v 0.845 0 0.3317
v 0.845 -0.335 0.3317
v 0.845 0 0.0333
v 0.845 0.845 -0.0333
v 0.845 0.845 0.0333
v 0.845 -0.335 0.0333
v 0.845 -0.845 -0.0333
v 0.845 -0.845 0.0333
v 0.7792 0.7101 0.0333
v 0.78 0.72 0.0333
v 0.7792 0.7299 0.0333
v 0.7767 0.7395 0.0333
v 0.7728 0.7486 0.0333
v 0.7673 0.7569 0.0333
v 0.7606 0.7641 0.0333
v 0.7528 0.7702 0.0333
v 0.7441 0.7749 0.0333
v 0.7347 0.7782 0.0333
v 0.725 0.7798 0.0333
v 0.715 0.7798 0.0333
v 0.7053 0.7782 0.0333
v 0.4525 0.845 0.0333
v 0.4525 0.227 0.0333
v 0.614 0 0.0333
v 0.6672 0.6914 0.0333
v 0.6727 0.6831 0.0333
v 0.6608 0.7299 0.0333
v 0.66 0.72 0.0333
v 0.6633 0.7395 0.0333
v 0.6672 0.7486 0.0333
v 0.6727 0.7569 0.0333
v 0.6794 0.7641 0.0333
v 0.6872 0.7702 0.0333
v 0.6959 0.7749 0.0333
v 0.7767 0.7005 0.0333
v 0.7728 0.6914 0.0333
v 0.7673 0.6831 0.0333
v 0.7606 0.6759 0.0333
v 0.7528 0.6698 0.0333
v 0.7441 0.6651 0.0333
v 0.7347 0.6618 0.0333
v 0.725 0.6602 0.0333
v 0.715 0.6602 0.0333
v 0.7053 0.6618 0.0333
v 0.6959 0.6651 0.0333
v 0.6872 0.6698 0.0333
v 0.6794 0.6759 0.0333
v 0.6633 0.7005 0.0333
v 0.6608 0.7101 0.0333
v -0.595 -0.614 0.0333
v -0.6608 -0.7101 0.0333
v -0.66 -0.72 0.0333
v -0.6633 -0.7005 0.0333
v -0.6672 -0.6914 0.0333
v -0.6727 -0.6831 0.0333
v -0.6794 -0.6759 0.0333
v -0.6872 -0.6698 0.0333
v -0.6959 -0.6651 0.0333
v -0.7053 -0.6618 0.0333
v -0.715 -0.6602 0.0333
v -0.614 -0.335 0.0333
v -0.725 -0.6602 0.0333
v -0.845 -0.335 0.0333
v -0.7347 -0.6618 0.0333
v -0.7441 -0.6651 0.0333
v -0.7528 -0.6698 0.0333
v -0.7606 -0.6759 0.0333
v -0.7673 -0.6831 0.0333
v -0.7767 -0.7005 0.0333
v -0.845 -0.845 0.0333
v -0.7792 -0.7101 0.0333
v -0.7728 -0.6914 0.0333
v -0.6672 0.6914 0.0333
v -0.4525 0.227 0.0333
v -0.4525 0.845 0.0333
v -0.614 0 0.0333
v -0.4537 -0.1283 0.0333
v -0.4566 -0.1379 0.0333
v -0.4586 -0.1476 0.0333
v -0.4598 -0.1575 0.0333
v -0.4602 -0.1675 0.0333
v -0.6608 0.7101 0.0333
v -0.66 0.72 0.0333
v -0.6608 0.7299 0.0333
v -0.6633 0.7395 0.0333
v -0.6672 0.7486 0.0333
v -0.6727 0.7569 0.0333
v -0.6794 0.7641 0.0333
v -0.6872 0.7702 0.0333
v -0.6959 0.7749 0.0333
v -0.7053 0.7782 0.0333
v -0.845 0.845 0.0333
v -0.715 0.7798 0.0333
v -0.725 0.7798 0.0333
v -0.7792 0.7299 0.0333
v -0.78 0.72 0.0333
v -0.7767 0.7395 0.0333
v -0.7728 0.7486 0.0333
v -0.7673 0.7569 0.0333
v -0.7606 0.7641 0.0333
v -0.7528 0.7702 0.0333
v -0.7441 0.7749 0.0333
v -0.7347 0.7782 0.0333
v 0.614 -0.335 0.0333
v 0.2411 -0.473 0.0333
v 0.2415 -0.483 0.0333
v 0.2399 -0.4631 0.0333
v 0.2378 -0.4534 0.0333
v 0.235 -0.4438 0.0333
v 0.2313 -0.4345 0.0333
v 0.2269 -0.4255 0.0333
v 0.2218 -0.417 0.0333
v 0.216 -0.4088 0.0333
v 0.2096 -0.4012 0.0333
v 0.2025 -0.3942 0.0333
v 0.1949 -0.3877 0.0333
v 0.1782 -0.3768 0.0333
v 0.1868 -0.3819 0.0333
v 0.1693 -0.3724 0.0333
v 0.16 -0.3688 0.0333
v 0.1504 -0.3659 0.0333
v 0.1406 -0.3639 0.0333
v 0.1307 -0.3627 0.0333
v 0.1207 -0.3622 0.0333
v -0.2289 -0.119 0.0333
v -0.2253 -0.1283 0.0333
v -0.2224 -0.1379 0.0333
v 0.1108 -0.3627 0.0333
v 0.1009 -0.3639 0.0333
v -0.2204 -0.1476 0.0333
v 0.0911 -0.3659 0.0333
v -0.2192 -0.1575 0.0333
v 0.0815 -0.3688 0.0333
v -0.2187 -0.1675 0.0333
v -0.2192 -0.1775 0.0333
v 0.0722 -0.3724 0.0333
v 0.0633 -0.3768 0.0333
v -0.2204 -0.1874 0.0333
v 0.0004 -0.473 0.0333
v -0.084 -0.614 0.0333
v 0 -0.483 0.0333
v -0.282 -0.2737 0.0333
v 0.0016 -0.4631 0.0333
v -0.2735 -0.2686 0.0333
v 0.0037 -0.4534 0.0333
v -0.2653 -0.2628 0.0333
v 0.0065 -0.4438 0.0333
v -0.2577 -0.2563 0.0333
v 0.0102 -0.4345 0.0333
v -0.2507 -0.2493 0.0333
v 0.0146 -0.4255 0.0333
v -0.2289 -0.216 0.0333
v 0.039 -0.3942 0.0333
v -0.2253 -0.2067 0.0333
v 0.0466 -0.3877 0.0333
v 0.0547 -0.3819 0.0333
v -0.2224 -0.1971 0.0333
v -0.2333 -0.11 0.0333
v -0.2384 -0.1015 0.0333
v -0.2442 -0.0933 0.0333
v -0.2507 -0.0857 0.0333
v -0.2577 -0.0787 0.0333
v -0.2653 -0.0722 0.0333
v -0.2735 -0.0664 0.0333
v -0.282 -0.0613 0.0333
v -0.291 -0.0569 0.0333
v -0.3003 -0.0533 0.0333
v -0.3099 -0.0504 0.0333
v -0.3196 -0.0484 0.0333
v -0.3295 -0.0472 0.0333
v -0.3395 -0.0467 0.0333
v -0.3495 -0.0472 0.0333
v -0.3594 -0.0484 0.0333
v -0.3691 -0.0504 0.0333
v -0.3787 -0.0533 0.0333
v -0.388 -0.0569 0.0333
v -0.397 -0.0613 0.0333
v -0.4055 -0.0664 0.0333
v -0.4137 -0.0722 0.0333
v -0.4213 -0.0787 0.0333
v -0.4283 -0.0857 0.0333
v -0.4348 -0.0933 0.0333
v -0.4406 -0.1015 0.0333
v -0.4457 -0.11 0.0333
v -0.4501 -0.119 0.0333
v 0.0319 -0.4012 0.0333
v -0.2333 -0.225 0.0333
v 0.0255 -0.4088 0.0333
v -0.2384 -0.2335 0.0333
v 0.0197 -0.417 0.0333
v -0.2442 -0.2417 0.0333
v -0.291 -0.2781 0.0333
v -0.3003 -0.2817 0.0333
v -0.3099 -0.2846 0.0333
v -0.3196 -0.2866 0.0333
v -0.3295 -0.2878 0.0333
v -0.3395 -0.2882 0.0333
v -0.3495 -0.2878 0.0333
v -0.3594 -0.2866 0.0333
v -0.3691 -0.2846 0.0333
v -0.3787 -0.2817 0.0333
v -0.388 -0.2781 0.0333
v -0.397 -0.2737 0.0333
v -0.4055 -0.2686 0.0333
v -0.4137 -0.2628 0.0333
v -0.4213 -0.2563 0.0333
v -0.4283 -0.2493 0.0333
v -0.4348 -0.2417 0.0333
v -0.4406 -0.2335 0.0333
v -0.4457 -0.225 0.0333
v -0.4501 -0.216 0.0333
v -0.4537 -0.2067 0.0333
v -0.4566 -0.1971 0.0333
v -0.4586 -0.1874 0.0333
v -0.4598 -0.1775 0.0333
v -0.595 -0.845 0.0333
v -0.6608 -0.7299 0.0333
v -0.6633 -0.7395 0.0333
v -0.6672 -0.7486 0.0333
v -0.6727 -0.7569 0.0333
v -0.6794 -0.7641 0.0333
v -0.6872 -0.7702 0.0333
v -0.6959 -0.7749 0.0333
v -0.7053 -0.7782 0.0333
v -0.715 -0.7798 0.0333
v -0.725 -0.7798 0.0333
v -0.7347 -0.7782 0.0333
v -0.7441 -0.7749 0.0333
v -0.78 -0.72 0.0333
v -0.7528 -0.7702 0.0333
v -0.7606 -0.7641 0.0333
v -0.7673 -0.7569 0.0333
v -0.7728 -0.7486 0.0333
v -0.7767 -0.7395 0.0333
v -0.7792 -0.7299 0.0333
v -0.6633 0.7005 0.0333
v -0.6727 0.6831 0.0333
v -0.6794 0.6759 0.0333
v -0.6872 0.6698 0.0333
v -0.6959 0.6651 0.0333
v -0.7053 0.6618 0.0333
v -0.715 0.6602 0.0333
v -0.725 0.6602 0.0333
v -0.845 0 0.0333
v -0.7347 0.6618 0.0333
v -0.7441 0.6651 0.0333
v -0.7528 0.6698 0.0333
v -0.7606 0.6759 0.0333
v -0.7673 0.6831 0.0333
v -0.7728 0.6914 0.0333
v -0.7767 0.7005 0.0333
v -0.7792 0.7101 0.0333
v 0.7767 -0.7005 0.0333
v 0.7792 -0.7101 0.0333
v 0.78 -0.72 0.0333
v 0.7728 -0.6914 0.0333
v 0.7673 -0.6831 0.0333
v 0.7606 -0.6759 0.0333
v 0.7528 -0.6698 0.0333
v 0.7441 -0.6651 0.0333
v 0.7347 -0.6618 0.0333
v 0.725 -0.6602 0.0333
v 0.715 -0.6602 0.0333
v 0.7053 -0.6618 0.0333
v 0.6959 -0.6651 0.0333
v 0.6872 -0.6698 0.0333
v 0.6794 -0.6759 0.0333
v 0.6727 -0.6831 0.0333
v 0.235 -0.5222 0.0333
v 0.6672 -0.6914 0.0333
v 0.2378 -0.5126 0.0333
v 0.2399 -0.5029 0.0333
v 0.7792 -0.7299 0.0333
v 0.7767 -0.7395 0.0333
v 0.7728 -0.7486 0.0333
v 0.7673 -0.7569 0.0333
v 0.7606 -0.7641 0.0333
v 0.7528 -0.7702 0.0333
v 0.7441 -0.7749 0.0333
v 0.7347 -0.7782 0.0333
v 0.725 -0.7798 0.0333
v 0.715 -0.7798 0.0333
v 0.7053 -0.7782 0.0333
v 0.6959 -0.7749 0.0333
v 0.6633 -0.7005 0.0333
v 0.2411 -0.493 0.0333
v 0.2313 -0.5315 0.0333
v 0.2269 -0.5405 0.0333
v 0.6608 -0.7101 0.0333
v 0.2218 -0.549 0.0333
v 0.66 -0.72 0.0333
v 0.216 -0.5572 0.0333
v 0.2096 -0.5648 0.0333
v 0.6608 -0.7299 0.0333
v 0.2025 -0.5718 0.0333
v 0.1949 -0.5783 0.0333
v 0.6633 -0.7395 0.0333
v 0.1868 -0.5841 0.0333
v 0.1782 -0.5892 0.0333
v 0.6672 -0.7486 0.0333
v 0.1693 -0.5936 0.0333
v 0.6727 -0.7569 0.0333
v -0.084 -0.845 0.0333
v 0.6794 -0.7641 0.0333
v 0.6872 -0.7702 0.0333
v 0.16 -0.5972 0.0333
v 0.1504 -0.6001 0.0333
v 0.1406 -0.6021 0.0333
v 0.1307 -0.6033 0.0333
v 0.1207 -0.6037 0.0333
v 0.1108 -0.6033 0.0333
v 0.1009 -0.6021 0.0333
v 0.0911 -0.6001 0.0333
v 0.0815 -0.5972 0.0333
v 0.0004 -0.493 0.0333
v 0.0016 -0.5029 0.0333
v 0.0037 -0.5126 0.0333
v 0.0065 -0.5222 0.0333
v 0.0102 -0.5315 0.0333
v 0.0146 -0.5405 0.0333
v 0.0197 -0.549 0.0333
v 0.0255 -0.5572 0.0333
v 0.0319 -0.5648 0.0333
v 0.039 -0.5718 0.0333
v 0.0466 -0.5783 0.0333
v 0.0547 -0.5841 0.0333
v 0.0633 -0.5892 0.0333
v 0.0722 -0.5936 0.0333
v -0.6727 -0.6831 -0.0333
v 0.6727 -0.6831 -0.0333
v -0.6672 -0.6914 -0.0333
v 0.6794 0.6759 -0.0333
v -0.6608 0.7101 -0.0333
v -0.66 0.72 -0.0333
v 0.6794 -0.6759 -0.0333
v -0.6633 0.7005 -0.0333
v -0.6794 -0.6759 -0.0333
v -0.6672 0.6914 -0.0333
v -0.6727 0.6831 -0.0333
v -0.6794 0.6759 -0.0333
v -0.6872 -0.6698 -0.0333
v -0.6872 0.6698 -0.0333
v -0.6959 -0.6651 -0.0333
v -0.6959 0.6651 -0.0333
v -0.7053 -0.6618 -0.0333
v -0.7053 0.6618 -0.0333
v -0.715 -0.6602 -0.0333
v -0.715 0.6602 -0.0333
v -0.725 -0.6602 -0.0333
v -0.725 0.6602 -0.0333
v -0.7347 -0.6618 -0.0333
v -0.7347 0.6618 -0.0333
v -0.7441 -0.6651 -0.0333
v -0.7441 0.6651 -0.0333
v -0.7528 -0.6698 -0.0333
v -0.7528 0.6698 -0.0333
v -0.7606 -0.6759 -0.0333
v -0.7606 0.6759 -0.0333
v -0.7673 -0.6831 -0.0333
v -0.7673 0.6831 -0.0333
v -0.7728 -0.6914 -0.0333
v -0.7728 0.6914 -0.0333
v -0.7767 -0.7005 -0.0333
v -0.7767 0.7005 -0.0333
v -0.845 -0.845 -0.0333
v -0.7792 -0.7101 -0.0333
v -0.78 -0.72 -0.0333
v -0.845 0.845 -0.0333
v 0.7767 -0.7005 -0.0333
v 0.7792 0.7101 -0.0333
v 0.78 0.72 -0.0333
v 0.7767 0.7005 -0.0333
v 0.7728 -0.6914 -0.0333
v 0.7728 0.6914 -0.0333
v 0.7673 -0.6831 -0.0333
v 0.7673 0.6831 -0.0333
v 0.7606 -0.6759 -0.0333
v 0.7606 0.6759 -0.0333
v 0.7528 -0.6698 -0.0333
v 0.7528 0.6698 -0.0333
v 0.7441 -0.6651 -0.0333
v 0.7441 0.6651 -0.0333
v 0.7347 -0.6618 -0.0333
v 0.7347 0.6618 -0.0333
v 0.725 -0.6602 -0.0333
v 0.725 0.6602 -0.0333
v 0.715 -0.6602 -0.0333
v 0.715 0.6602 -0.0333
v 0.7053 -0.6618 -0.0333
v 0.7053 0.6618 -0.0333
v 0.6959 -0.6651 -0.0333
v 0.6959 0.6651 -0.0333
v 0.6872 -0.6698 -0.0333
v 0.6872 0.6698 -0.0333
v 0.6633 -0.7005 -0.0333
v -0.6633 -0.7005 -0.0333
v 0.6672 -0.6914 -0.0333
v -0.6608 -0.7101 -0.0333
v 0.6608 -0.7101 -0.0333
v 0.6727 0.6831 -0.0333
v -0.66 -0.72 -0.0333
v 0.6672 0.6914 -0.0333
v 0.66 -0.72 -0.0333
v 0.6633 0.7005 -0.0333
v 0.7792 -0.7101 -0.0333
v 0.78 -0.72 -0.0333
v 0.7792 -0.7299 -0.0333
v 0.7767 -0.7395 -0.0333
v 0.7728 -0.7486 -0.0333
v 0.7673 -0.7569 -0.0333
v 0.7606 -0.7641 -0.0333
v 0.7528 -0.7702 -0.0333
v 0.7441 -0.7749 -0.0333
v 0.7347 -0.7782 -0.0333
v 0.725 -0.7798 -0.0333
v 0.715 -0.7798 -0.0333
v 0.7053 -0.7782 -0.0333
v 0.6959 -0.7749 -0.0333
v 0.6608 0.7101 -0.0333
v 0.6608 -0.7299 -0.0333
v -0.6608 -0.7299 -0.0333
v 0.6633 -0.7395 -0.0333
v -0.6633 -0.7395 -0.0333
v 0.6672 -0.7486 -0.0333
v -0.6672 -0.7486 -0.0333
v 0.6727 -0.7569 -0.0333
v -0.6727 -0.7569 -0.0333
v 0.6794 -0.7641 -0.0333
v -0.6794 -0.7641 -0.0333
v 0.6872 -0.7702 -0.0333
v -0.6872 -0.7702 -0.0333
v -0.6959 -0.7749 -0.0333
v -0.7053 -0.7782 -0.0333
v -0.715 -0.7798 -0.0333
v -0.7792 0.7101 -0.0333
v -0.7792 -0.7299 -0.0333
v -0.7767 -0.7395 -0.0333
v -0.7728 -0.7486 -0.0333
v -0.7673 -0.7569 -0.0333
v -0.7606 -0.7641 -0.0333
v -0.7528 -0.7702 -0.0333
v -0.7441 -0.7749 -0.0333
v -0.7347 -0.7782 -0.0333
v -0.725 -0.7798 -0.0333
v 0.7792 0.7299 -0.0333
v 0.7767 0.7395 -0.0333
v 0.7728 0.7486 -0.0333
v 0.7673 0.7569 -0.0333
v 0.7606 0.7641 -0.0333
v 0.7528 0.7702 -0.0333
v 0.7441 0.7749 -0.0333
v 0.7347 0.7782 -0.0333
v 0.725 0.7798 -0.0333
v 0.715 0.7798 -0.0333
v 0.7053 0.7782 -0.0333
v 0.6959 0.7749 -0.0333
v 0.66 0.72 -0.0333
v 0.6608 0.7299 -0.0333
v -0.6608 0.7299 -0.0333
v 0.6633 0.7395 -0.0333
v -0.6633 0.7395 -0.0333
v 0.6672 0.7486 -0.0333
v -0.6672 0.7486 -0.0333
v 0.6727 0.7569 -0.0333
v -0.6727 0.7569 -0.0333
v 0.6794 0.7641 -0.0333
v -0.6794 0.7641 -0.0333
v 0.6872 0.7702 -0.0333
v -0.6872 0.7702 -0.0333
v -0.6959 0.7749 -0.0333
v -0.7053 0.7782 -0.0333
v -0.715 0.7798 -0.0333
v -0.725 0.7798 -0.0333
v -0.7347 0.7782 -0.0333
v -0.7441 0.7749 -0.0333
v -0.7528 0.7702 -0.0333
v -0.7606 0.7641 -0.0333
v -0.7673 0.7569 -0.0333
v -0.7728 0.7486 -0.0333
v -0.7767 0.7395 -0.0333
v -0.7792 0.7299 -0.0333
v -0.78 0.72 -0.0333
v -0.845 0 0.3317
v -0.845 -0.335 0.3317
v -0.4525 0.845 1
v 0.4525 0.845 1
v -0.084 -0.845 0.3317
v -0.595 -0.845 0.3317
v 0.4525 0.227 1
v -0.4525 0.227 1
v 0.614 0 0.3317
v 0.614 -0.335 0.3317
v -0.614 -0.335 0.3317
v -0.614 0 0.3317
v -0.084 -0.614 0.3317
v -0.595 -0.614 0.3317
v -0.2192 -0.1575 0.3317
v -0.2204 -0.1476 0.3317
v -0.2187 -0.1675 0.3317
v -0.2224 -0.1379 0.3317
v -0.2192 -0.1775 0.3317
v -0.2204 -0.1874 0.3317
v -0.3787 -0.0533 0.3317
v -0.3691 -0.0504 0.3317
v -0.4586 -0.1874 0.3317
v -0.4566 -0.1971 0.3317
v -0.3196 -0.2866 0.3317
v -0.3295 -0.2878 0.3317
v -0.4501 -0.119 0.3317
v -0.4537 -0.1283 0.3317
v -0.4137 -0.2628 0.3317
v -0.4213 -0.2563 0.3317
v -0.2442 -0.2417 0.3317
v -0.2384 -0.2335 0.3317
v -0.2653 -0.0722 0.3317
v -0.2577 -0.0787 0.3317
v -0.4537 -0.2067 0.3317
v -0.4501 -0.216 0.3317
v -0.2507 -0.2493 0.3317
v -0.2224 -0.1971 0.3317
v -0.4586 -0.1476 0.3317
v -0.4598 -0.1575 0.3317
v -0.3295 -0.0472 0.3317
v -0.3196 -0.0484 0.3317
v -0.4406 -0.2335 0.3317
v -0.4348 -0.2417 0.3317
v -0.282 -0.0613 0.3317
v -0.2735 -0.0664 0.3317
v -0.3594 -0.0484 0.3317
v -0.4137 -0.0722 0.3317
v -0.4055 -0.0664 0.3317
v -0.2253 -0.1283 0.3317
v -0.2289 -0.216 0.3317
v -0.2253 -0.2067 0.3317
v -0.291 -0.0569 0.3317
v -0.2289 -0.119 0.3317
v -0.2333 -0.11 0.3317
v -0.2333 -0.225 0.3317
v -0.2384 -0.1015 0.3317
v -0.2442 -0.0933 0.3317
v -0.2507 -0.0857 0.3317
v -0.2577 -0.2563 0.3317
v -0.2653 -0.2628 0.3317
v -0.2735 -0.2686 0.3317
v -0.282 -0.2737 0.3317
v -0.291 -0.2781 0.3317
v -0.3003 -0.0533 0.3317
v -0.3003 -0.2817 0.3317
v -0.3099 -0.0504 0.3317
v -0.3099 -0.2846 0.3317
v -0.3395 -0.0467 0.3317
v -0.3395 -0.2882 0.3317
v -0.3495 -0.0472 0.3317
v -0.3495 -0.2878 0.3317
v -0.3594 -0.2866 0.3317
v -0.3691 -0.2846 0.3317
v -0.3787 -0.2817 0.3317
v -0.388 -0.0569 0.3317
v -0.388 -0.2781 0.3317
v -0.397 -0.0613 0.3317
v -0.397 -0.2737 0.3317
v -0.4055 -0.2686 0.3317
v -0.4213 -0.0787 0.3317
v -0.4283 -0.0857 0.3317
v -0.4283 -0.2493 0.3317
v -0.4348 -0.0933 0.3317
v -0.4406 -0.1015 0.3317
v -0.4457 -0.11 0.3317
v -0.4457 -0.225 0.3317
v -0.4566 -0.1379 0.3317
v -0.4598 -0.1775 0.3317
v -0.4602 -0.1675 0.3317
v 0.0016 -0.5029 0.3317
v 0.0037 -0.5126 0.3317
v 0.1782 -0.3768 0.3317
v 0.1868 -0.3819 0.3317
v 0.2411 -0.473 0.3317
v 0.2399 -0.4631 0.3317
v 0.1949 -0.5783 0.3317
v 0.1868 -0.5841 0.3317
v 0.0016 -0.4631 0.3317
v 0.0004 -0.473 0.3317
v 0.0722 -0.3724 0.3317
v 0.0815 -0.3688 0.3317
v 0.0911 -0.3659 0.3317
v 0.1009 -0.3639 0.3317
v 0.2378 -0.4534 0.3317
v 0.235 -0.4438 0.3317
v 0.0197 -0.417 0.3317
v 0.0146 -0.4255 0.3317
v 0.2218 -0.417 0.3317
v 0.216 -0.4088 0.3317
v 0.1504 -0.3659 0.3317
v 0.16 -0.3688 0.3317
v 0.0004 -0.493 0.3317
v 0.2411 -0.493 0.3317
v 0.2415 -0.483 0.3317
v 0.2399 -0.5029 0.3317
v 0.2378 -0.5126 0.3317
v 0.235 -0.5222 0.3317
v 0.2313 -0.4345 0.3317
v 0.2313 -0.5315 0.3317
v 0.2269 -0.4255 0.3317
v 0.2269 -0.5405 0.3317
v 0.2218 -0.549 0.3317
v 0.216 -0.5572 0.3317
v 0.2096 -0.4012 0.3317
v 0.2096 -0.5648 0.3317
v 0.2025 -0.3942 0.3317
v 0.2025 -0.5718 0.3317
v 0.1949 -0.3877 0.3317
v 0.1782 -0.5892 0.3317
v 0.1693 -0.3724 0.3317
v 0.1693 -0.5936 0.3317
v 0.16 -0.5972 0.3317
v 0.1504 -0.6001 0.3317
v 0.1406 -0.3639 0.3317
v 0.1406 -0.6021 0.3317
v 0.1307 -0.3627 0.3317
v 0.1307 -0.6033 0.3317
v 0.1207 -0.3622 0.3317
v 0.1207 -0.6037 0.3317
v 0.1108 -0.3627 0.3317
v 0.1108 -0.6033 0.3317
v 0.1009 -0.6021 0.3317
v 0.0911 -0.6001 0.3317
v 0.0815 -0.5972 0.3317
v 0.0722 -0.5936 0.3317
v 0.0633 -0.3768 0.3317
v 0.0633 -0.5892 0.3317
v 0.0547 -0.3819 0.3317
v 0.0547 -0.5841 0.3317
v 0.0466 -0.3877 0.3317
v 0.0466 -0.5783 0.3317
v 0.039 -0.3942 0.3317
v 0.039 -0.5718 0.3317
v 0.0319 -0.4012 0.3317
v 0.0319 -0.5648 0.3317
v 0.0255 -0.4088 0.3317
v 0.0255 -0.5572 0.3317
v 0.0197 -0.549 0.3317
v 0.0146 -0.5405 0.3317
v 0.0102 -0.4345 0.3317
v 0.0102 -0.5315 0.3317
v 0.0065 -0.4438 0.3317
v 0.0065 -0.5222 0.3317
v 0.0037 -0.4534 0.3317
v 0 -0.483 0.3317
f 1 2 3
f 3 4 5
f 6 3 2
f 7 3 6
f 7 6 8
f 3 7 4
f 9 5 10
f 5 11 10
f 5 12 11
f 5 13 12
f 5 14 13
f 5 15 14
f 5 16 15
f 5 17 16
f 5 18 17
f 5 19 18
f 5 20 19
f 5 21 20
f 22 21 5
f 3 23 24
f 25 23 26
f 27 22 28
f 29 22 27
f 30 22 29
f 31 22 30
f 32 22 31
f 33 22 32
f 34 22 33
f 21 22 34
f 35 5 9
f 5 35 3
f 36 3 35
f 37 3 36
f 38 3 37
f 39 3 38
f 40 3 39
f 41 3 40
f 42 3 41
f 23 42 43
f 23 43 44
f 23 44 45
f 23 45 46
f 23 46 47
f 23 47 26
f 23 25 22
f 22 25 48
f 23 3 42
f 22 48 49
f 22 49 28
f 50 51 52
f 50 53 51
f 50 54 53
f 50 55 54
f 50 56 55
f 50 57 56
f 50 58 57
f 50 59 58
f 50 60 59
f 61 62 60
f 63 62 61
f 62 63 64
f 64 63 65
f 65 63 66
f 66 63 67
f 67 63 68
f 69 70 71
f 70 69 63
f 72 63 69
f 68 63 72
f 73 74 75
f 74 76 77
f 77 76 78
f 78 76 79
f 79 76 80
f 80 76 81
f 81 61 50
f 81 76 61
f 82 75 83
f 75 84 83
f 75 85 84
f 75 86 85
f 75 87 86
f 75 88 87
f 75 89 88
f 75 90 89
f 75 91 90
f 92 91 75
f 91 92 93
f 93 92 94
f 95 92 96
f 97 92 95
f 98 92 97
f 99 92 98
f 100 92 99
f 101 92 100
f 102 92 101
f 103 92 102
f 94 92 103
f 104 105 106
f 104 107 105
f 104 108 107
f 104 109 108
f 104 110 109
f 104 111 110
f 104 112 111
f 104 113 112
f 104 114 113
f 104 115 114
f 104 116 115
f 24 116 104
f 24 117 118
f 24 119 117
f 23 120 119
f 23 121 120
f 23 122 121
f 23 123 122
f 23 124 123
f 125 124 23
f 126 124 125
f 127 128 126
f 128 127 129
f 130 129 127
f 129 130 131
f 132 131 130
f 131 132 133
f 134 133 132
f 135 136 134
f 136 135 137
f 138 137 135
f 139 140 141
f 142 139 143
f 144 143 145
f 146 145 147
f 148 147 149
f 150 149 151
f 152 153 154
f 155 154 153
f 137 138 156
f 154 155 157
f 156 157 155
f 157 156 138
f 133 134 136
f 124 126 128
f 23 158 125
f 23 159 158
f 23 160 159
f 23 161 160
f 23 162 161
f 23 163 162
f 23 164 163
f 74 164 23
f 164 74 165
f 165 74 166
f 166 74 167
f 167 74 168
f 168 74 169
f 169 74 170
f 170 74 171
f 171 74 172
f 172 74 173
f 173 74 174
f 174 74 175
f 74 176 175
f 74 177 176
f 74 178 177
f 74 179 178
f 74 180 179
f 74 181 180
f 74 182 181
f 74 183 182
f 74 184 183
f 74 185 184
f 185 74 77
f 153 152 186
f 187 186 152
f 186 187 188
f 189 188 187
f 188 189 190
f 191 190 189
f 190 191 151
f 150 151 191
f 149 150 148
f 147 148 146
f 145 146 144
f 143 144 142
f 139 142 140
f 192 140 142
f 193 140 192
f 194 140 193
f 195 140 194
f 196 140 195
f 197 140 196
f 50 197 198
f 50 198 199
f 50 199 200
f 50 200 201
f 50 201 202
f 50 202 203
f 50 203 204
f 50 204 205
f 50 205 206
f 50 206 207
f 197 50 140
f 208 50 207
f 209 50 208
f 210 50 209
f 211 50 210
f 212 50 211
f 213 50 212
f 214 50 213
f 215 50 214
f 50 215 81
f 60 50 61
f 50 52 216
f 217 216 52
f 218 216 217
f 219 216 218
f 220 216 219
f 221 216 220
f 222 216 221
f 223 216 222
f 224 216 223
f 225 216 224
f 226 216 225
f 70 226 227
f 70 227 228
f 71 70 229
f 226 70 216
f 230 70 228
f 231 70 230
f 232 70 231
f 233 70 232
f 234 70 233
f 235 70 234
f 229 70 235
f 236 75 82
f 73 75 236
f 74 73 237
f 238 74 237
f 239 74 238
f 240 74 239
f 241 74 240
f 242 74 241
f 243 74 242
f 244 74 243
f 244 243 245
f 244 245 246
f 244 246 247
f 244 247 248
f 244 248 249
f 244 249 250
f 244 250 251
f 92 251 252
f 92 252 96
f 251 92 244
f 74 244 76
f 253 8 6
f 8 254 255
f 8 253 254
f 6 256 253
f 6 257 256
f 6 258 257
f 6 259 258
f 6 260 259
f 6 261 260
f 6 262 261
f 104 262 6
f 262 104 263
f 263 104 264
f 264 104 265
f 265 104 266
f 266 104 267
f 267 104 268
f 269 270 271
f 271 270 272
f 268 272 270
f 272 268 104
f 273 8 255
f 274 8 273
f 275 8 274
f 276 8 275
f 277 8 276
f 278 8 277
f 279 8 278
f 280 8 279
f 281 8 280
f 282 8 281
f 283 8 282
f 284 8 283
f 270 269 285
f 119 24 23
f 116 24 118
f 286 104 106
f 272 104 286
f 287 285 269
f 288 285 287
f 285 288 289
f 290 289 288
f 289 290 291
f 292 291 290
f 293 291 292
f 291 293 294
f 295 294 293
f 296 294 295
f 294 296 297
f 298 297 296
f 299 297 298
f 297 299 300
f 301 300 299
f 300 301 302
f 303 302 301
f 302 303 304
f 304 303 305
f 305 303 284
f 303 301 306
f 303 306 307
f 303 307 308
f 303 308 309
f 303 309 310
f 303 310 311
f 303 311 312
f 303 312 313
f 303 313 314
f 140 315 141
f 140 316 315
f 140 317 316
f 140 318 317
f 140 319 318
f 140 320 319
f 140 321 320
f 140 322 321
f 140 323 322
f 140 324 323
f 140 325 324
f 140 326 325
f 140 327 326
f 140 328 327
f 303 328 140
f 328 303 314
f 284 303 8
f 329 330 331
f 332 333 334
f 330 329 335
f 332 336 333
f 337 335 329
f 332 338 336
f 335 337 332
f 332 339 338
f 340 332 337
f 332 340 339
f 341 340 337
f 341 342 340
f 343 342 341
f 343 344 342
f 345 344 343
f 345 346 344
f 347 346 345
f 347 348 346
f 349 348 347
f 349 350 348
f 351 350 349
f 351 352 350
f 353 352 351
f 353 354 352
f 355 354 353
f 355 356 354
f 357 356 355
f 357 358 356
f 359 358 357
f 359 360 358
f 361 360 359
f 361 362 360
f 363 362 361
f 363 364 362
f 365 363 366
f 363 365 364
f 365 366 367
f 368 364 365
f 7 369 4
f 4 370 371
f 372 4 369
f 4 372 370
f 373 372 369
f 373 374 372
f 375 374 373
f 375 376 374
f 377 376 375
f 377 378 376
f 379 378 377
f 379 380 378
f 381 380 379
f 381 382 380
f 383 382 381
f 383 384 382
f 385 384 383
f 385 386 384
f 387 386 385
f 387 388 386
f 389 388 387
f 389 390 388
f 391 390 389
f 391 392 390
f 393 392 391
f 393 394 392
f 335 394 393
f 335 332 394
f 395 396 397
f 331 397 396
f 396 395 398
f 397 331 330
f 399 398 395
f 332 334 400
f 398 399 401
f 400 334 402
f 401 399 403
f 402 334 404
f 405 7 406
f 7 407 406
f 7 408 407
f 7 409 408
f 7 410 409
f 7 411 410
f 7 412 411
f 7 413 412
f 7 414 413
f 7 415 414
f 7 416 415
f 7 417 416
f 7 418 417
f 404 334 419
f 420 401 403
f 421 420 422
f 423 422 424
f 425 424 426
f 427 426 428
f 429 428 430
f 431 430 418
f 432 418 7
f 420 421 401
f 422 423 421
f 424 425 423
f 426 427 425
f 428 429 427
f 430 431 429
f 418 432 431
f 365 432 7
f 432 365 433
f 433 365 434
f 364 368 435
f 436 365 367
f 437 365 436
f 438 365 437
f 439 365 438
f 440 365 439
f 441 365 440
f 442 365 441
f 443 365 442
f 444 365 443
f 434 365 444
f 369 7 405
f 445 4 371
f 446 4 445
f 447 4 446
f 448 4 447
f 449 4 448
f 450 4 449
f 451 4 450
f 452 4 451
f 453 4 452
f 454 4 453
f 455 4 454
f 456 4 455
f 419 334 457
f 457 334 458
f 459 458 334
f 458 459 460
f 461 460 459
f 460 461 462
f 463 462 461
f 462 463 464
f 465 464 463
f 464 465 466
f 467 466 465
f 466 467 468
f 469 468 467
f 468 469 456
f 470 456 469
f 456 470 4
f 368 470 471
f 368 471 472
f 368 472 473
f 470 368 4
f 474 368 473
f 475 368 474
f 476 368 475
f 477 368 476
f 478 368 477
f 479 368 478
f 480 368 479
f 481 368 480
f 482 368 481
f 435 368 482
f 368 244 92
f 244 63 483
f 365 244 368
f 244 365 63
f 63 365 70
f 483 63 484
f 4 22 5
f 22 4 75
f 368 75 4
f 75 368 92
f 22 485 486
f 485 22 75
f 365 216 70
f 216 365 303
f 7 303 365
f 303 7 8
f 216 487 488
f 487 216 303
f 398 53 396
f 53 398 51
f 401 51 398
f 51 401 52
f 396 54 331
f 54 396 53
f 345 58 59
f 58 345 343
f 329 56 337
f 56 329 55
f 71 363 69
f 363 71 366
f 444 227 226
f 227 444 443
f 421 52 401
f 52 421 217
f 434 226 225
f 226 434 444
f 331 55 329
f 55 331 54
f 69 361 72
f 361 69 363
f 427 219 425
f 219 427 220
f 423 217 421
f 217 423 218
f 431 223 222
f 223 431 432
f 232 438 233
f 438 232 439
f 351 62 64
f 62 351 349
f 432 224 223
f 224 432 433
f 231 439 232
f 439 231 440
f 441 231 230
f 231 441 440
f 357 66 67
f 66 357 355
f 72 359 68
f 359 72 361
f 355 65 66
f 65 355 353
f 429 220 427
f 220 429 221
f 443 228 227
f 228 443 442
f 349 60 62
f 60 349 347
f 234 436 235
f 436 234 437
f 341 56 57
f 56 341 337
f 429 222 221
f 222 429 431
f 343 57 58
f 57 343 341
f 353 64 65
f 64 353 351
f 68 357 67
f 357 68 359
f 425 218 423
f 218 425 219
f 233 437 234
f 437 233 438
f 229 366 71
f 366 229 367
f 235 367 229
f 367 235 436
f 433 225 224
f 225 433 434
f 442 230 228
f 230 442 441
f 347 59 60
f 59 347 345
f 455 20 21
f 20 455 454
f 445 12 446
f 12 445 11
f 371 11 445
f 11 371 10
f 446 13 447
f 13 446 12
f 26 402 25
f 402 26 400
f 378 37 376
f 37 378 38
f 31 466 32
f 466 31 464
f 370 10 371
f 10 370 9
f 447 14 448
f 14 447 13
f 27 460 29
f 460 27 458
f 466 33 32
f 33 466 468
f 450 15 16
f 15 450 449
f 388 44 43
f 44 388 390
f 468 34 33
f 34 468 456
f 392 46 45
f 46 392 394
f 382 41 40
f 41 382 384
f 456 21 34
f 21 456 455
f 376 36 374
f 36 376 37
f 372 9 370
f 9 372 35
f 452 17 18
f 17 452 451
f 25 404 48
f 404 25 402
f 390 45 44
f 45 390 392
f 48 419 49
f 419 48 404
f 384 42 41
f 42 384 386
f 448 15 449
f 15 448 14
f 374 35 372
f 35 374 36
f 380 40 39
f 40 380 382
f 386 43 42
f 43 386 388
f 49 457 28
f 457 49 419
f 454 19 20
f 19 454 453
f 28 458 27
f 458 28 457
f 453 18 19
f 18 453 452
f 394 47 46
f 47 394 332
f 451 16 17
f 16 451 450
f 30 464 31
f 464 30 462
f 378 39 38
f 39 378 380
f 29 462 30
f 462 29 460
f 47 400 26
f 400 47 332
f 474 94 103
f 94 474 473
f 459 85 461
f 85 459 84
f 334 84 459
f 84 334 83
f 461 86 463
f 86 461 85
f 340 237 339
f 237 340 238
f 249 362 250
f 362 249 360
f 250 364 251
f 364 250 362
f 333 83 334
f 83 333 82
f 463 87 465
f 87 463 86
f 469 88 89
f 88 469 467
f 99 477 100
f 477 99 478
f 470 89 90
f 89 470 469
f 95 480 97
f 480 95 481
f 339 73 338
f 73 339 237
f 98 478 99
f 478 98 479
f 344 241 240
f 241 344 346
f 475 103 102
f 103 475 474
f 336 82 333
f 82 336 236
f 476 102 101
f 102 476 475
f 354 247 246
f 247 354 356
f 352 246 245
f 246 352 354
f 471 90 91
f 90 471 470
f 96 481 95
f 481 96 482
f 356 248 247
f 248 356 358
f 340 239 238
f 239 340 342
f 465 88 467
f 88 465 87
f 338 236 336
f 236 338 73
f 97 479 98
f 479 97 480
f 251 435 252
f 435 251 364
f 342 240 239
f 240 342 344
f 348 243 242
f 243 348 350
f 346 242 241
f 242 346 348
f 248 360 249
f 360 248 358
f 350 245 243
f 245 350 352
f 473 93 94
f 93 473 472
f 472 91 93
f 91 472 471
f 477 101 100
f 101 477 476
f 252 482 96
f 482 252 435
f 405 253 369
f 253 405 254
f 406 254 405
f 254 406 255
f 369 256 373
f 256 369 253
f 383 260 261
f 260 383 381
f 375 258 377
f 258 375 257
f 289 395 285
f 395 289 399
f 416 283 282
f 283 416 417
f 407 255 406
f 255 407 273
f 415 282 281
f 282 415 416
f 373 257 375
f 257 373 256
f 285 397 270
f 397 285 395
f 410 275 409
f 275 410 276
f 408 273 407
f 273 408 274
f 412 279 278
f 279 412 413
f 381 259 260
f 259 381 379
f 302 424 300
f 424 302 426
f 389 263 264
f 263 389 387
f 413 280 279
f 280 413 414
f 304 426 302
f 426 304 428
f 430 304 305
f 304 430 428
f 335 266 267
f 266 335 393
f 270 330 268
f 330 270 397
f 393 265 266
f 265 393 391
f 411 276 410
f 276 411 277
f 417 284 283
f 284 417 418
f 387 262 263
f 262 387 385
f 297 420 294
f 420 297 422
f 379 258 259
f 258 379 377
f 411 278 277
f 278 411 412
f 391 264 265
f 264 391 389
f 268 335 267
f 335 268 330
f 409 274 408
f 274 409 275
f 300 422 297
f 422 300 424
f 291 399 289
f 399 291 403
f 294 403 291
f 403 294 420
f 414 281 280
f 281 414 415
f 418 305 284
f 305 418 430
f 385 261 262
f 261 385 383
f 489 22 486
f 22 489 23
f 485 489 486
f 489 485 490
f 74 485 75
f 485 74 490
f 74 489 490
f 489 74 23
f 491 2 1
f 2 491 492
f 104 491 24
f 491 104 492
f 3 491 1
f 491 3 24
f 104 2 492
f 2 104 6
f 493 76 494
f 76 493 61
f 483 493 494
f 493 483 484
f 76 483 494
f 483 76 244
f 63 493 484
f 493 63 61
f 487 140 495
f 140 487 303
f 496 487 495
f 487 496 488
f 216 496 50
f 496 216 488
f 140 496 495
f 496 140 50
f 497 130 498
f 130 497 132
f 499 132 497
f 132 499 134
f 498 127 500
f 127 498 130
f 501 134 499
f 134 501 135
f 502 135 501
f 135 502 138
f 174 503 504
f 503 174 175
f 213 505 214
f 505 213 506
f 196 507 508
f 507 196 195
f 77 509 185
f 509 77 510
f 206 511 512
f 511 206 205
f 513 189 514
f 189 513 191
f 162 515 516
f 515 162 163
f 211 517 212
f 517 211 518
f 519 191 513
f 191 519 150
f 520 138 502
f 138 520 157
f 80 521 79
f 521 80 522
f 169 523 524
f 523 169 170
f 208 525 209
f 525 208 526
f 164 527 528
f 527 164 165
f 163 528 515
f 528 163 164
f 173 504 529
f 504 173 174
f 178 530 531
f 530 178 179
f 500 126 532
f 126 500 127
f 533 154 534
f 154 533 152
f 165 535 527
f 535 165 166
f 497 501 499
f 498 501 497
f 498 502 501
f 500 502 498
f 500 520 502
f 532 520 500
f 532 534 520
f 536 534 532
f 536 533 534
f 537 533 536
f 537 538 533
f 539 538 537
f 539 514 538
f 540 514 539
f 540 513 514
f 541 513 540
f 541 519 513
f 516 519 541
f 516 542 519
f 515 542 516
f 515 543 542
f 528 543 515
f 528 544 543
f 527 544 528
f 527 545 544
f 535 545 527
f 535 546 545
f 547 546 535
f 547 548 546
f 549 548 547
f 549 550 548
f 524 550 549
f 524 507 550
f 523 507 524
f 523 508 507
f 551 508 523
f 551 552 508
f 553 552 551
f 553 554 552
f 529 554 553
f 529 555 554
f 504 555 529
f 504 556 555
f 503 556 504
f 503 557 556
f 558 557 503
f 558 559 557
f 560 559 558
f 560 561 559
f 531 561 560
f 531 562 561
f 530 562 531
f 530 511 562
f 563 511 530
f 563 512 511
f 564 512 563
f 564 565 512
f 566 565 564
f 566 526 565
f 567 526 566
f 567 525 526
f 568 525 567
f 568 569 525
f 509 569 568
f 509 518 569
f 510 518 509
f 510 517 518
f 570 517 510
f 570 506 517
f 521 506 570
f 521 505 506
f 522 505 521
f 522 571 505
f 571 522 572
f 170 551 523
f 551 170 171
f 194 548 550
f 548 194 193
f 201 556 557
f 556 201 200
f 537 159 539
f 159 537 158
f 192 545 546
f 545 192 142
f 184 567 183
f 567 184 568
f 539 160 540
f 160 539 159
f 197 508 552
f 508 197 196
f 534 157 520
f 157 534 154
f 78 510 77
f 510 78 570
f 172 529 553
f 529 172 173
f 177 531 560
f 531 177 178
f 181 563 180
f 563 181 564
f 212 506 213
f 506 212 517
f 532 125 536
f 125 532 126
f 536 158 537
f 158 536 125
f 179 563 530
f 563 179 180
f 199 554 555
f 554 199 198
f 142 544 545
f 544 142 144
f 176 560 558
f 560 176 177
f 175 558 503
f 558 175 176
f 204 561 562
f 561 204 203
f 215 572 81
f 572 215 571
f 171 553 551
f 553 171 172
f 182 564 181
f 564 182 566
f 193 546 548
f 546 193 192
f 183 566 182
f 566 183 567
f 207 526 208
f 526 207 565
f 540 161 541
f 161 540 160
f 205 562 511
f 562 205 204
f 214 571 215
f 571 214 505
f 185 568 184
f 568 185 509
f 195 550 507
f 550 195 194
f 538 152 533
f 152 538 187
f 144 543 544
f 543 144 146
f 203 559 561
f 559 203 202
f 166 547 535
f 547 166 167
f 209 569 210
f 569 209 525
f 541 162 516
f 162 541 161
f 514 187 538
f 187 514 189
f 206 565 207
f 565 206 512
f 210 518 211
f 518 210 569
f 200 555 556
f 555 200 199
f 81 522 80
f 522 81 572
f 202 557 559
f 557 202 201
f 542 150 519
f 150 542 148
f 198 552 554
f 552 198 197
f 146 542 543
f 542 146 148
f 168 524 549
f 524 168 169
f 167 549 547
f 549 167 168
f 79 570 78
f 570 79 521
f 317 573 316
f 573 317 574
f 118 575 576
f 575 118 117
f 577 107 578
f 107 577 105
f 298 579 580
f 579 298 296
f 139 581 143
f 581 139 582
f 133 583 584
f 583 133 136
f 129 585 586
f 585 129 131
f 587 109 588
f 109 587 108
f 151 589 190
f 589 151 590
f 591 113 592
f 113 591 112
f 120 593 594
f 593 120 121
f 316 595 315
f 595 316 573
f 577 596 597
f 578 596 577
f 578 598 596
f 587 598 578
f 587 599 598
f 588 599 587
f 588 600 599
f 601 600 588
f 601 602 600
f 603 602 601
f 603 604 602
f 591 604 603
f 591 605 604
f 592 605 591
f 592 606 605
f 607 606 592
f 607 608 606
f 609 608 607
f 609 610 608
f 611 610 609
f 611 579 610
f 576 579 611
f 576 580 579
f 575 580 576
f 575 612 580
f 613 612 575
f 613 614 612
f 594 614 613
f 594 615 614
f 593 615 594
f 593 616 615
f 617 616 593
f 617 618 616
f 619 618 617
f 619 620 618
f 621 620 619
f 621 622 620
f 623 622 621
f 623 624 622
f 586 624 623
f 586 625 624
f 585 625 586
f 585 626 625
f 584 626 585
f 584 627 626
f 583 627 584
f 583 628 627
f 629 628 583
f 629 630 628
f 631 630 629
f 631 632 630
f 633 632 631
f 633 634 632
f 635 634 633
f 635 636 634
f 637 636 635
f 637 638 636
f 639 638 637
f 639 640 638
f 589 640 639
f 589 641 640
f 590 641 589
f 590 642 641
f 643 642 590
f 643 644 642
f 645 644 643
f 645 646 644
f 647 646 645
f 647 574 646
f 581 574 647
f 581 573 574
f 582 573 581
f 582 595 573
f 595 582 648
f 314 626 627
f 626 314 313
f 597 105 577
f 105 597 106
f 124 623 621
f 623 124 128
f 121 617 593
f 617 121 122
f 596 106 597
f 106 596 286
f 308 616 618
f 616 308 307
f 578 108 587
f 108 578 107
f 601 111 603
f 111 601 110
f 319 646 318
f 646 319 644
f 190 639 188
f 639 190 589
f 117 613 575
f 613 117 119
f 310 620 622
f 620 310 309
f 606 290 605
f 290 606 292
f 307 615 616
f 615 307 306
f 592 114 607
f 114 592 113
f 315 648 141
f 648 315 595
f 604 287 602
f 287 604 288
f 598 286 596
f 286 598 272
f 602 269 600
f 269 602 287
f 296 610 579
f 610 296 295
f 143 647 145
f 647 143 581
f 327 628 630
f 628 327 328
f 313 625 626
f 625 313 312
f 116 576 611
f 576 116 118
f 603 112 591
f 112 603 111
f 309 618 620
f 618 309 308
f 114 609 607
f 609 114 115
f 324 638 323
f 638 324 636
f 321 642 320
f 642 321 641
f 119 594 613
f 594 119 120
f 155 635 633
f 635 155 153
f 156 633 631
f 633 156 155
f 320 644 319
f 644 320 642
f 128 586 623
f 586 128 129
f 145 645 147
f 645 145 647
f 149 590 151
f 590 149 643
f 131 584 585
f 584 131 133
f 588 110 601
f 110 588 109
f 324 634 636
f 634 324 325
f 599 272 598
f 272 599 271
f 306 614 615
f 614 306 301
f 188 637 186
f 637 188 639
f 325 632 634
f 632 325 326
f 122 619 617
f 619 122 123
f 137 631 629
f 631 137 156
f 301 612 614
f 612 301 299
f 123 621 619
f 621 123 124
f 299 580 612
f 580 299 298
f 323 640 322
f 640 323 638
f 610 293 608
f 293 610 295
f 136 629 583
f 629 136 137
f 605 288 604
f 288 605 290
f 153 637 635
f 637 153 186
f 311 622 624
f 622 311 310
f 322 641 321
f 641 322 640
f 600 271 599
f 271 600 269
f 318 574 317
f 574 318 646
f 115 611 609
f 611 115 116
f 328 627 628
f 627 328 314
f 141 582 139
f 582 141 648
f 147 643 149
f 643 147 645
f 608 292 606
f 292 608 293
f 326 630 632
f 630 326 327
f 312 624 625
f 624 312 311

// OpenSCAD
$fa=1;
$fs=0.01;

mc_fins_width = .905;
mc_fins_length = .618;
mc_fins_height = 1.000;

board_height = .0667;
hole_radius = .060;
hole_offset = .065 + hole_radius;

mc_width = 1.69;
mc_length = 1.69;
mc_height = .495;

terminal_two_posts_width = .335;
terminal_three_posts_width = .511;
terminal_length = .231;
terminal_height = .315;

capacitor_radius = .2415 / 2;

module mc() {
    
    difference() {
        cube([mc_width, mc_length, board_height], center = true);
        
        translate(
        [
            (-mc_width / 2 + hole_offset), 
            (-mc_length / 2 + hole_offset), 0 
        ])
        cylinder(h = board_height + .1, r = hole_radius, center = true);
        
        translate(
        [
            (mc_width / 2 - hole_offset), 
            (mc_length / 2 - hole_offset), 0 
        ])
        cylinder(h = board_height + .1, r = hole_radius, center = true);
        
        translate(
        [
            -(mc_width / 2 - hole_offset), 
            (mc_length / 2 - hole_offset), 0 
        ])
        cylinder(h = board_height + .1, r = hole_radius, center = true);
        
        translate(
        [
            (mc_width / 2 - hole_offset), 
            -(mc_length / 2 - hole_offset), 0 
        ])
        cylinder(h = board_height + .1, r = hole_radius, center = true);
    }
    
    // fins
    translate(
    [
        -mc_fins_width / 2, 
        mc_length / 2 - mc_fins_length,
        0
    ])
    cube([mc_fins_width, mc_fins_length, mc_fins_height]);
    
    // two post one
    translate(
    [
        mc_width / 2 - terminal_length, 
        -terminal_two_posts_width, 
        board_height - .05
    ])
    cube([terminal_length, terminal_two_posts_width, terminal_height]);
    
    // two post two
    translate(
    [
        -mc_width / 2,  
        -terminal_two_posts_width, 
        board_height - .05
    ])
    cube([terminal_length, terminal_two_posts_width, terminal_height]);
    
    // three post
    translate(
    [
        hole_offset * 2 - mc_width / 2, 
        -mc_length / 2, 
        board_height - .05
    ])
    cube([terminal_three_posts_width, terminal_length, terminal_height]);
    
    // capacitor one
    translate(
    [
        hole_offset * 2 - mc_width / 2 + terminal_three_posts_width / 2,
        -terminal_two_posts_width / 2,
        board_height - .05
    ])
    cylinder(h = terminal_height, r = capacitor_radius);
    
    // capacitor two
    translate(
    [
        capacitor_radius,
        -capacitor_radius * 4,
        board_height - .05
    ])
    cylinder(h = terminal_height, r = capacitor_radius);}
mc();
